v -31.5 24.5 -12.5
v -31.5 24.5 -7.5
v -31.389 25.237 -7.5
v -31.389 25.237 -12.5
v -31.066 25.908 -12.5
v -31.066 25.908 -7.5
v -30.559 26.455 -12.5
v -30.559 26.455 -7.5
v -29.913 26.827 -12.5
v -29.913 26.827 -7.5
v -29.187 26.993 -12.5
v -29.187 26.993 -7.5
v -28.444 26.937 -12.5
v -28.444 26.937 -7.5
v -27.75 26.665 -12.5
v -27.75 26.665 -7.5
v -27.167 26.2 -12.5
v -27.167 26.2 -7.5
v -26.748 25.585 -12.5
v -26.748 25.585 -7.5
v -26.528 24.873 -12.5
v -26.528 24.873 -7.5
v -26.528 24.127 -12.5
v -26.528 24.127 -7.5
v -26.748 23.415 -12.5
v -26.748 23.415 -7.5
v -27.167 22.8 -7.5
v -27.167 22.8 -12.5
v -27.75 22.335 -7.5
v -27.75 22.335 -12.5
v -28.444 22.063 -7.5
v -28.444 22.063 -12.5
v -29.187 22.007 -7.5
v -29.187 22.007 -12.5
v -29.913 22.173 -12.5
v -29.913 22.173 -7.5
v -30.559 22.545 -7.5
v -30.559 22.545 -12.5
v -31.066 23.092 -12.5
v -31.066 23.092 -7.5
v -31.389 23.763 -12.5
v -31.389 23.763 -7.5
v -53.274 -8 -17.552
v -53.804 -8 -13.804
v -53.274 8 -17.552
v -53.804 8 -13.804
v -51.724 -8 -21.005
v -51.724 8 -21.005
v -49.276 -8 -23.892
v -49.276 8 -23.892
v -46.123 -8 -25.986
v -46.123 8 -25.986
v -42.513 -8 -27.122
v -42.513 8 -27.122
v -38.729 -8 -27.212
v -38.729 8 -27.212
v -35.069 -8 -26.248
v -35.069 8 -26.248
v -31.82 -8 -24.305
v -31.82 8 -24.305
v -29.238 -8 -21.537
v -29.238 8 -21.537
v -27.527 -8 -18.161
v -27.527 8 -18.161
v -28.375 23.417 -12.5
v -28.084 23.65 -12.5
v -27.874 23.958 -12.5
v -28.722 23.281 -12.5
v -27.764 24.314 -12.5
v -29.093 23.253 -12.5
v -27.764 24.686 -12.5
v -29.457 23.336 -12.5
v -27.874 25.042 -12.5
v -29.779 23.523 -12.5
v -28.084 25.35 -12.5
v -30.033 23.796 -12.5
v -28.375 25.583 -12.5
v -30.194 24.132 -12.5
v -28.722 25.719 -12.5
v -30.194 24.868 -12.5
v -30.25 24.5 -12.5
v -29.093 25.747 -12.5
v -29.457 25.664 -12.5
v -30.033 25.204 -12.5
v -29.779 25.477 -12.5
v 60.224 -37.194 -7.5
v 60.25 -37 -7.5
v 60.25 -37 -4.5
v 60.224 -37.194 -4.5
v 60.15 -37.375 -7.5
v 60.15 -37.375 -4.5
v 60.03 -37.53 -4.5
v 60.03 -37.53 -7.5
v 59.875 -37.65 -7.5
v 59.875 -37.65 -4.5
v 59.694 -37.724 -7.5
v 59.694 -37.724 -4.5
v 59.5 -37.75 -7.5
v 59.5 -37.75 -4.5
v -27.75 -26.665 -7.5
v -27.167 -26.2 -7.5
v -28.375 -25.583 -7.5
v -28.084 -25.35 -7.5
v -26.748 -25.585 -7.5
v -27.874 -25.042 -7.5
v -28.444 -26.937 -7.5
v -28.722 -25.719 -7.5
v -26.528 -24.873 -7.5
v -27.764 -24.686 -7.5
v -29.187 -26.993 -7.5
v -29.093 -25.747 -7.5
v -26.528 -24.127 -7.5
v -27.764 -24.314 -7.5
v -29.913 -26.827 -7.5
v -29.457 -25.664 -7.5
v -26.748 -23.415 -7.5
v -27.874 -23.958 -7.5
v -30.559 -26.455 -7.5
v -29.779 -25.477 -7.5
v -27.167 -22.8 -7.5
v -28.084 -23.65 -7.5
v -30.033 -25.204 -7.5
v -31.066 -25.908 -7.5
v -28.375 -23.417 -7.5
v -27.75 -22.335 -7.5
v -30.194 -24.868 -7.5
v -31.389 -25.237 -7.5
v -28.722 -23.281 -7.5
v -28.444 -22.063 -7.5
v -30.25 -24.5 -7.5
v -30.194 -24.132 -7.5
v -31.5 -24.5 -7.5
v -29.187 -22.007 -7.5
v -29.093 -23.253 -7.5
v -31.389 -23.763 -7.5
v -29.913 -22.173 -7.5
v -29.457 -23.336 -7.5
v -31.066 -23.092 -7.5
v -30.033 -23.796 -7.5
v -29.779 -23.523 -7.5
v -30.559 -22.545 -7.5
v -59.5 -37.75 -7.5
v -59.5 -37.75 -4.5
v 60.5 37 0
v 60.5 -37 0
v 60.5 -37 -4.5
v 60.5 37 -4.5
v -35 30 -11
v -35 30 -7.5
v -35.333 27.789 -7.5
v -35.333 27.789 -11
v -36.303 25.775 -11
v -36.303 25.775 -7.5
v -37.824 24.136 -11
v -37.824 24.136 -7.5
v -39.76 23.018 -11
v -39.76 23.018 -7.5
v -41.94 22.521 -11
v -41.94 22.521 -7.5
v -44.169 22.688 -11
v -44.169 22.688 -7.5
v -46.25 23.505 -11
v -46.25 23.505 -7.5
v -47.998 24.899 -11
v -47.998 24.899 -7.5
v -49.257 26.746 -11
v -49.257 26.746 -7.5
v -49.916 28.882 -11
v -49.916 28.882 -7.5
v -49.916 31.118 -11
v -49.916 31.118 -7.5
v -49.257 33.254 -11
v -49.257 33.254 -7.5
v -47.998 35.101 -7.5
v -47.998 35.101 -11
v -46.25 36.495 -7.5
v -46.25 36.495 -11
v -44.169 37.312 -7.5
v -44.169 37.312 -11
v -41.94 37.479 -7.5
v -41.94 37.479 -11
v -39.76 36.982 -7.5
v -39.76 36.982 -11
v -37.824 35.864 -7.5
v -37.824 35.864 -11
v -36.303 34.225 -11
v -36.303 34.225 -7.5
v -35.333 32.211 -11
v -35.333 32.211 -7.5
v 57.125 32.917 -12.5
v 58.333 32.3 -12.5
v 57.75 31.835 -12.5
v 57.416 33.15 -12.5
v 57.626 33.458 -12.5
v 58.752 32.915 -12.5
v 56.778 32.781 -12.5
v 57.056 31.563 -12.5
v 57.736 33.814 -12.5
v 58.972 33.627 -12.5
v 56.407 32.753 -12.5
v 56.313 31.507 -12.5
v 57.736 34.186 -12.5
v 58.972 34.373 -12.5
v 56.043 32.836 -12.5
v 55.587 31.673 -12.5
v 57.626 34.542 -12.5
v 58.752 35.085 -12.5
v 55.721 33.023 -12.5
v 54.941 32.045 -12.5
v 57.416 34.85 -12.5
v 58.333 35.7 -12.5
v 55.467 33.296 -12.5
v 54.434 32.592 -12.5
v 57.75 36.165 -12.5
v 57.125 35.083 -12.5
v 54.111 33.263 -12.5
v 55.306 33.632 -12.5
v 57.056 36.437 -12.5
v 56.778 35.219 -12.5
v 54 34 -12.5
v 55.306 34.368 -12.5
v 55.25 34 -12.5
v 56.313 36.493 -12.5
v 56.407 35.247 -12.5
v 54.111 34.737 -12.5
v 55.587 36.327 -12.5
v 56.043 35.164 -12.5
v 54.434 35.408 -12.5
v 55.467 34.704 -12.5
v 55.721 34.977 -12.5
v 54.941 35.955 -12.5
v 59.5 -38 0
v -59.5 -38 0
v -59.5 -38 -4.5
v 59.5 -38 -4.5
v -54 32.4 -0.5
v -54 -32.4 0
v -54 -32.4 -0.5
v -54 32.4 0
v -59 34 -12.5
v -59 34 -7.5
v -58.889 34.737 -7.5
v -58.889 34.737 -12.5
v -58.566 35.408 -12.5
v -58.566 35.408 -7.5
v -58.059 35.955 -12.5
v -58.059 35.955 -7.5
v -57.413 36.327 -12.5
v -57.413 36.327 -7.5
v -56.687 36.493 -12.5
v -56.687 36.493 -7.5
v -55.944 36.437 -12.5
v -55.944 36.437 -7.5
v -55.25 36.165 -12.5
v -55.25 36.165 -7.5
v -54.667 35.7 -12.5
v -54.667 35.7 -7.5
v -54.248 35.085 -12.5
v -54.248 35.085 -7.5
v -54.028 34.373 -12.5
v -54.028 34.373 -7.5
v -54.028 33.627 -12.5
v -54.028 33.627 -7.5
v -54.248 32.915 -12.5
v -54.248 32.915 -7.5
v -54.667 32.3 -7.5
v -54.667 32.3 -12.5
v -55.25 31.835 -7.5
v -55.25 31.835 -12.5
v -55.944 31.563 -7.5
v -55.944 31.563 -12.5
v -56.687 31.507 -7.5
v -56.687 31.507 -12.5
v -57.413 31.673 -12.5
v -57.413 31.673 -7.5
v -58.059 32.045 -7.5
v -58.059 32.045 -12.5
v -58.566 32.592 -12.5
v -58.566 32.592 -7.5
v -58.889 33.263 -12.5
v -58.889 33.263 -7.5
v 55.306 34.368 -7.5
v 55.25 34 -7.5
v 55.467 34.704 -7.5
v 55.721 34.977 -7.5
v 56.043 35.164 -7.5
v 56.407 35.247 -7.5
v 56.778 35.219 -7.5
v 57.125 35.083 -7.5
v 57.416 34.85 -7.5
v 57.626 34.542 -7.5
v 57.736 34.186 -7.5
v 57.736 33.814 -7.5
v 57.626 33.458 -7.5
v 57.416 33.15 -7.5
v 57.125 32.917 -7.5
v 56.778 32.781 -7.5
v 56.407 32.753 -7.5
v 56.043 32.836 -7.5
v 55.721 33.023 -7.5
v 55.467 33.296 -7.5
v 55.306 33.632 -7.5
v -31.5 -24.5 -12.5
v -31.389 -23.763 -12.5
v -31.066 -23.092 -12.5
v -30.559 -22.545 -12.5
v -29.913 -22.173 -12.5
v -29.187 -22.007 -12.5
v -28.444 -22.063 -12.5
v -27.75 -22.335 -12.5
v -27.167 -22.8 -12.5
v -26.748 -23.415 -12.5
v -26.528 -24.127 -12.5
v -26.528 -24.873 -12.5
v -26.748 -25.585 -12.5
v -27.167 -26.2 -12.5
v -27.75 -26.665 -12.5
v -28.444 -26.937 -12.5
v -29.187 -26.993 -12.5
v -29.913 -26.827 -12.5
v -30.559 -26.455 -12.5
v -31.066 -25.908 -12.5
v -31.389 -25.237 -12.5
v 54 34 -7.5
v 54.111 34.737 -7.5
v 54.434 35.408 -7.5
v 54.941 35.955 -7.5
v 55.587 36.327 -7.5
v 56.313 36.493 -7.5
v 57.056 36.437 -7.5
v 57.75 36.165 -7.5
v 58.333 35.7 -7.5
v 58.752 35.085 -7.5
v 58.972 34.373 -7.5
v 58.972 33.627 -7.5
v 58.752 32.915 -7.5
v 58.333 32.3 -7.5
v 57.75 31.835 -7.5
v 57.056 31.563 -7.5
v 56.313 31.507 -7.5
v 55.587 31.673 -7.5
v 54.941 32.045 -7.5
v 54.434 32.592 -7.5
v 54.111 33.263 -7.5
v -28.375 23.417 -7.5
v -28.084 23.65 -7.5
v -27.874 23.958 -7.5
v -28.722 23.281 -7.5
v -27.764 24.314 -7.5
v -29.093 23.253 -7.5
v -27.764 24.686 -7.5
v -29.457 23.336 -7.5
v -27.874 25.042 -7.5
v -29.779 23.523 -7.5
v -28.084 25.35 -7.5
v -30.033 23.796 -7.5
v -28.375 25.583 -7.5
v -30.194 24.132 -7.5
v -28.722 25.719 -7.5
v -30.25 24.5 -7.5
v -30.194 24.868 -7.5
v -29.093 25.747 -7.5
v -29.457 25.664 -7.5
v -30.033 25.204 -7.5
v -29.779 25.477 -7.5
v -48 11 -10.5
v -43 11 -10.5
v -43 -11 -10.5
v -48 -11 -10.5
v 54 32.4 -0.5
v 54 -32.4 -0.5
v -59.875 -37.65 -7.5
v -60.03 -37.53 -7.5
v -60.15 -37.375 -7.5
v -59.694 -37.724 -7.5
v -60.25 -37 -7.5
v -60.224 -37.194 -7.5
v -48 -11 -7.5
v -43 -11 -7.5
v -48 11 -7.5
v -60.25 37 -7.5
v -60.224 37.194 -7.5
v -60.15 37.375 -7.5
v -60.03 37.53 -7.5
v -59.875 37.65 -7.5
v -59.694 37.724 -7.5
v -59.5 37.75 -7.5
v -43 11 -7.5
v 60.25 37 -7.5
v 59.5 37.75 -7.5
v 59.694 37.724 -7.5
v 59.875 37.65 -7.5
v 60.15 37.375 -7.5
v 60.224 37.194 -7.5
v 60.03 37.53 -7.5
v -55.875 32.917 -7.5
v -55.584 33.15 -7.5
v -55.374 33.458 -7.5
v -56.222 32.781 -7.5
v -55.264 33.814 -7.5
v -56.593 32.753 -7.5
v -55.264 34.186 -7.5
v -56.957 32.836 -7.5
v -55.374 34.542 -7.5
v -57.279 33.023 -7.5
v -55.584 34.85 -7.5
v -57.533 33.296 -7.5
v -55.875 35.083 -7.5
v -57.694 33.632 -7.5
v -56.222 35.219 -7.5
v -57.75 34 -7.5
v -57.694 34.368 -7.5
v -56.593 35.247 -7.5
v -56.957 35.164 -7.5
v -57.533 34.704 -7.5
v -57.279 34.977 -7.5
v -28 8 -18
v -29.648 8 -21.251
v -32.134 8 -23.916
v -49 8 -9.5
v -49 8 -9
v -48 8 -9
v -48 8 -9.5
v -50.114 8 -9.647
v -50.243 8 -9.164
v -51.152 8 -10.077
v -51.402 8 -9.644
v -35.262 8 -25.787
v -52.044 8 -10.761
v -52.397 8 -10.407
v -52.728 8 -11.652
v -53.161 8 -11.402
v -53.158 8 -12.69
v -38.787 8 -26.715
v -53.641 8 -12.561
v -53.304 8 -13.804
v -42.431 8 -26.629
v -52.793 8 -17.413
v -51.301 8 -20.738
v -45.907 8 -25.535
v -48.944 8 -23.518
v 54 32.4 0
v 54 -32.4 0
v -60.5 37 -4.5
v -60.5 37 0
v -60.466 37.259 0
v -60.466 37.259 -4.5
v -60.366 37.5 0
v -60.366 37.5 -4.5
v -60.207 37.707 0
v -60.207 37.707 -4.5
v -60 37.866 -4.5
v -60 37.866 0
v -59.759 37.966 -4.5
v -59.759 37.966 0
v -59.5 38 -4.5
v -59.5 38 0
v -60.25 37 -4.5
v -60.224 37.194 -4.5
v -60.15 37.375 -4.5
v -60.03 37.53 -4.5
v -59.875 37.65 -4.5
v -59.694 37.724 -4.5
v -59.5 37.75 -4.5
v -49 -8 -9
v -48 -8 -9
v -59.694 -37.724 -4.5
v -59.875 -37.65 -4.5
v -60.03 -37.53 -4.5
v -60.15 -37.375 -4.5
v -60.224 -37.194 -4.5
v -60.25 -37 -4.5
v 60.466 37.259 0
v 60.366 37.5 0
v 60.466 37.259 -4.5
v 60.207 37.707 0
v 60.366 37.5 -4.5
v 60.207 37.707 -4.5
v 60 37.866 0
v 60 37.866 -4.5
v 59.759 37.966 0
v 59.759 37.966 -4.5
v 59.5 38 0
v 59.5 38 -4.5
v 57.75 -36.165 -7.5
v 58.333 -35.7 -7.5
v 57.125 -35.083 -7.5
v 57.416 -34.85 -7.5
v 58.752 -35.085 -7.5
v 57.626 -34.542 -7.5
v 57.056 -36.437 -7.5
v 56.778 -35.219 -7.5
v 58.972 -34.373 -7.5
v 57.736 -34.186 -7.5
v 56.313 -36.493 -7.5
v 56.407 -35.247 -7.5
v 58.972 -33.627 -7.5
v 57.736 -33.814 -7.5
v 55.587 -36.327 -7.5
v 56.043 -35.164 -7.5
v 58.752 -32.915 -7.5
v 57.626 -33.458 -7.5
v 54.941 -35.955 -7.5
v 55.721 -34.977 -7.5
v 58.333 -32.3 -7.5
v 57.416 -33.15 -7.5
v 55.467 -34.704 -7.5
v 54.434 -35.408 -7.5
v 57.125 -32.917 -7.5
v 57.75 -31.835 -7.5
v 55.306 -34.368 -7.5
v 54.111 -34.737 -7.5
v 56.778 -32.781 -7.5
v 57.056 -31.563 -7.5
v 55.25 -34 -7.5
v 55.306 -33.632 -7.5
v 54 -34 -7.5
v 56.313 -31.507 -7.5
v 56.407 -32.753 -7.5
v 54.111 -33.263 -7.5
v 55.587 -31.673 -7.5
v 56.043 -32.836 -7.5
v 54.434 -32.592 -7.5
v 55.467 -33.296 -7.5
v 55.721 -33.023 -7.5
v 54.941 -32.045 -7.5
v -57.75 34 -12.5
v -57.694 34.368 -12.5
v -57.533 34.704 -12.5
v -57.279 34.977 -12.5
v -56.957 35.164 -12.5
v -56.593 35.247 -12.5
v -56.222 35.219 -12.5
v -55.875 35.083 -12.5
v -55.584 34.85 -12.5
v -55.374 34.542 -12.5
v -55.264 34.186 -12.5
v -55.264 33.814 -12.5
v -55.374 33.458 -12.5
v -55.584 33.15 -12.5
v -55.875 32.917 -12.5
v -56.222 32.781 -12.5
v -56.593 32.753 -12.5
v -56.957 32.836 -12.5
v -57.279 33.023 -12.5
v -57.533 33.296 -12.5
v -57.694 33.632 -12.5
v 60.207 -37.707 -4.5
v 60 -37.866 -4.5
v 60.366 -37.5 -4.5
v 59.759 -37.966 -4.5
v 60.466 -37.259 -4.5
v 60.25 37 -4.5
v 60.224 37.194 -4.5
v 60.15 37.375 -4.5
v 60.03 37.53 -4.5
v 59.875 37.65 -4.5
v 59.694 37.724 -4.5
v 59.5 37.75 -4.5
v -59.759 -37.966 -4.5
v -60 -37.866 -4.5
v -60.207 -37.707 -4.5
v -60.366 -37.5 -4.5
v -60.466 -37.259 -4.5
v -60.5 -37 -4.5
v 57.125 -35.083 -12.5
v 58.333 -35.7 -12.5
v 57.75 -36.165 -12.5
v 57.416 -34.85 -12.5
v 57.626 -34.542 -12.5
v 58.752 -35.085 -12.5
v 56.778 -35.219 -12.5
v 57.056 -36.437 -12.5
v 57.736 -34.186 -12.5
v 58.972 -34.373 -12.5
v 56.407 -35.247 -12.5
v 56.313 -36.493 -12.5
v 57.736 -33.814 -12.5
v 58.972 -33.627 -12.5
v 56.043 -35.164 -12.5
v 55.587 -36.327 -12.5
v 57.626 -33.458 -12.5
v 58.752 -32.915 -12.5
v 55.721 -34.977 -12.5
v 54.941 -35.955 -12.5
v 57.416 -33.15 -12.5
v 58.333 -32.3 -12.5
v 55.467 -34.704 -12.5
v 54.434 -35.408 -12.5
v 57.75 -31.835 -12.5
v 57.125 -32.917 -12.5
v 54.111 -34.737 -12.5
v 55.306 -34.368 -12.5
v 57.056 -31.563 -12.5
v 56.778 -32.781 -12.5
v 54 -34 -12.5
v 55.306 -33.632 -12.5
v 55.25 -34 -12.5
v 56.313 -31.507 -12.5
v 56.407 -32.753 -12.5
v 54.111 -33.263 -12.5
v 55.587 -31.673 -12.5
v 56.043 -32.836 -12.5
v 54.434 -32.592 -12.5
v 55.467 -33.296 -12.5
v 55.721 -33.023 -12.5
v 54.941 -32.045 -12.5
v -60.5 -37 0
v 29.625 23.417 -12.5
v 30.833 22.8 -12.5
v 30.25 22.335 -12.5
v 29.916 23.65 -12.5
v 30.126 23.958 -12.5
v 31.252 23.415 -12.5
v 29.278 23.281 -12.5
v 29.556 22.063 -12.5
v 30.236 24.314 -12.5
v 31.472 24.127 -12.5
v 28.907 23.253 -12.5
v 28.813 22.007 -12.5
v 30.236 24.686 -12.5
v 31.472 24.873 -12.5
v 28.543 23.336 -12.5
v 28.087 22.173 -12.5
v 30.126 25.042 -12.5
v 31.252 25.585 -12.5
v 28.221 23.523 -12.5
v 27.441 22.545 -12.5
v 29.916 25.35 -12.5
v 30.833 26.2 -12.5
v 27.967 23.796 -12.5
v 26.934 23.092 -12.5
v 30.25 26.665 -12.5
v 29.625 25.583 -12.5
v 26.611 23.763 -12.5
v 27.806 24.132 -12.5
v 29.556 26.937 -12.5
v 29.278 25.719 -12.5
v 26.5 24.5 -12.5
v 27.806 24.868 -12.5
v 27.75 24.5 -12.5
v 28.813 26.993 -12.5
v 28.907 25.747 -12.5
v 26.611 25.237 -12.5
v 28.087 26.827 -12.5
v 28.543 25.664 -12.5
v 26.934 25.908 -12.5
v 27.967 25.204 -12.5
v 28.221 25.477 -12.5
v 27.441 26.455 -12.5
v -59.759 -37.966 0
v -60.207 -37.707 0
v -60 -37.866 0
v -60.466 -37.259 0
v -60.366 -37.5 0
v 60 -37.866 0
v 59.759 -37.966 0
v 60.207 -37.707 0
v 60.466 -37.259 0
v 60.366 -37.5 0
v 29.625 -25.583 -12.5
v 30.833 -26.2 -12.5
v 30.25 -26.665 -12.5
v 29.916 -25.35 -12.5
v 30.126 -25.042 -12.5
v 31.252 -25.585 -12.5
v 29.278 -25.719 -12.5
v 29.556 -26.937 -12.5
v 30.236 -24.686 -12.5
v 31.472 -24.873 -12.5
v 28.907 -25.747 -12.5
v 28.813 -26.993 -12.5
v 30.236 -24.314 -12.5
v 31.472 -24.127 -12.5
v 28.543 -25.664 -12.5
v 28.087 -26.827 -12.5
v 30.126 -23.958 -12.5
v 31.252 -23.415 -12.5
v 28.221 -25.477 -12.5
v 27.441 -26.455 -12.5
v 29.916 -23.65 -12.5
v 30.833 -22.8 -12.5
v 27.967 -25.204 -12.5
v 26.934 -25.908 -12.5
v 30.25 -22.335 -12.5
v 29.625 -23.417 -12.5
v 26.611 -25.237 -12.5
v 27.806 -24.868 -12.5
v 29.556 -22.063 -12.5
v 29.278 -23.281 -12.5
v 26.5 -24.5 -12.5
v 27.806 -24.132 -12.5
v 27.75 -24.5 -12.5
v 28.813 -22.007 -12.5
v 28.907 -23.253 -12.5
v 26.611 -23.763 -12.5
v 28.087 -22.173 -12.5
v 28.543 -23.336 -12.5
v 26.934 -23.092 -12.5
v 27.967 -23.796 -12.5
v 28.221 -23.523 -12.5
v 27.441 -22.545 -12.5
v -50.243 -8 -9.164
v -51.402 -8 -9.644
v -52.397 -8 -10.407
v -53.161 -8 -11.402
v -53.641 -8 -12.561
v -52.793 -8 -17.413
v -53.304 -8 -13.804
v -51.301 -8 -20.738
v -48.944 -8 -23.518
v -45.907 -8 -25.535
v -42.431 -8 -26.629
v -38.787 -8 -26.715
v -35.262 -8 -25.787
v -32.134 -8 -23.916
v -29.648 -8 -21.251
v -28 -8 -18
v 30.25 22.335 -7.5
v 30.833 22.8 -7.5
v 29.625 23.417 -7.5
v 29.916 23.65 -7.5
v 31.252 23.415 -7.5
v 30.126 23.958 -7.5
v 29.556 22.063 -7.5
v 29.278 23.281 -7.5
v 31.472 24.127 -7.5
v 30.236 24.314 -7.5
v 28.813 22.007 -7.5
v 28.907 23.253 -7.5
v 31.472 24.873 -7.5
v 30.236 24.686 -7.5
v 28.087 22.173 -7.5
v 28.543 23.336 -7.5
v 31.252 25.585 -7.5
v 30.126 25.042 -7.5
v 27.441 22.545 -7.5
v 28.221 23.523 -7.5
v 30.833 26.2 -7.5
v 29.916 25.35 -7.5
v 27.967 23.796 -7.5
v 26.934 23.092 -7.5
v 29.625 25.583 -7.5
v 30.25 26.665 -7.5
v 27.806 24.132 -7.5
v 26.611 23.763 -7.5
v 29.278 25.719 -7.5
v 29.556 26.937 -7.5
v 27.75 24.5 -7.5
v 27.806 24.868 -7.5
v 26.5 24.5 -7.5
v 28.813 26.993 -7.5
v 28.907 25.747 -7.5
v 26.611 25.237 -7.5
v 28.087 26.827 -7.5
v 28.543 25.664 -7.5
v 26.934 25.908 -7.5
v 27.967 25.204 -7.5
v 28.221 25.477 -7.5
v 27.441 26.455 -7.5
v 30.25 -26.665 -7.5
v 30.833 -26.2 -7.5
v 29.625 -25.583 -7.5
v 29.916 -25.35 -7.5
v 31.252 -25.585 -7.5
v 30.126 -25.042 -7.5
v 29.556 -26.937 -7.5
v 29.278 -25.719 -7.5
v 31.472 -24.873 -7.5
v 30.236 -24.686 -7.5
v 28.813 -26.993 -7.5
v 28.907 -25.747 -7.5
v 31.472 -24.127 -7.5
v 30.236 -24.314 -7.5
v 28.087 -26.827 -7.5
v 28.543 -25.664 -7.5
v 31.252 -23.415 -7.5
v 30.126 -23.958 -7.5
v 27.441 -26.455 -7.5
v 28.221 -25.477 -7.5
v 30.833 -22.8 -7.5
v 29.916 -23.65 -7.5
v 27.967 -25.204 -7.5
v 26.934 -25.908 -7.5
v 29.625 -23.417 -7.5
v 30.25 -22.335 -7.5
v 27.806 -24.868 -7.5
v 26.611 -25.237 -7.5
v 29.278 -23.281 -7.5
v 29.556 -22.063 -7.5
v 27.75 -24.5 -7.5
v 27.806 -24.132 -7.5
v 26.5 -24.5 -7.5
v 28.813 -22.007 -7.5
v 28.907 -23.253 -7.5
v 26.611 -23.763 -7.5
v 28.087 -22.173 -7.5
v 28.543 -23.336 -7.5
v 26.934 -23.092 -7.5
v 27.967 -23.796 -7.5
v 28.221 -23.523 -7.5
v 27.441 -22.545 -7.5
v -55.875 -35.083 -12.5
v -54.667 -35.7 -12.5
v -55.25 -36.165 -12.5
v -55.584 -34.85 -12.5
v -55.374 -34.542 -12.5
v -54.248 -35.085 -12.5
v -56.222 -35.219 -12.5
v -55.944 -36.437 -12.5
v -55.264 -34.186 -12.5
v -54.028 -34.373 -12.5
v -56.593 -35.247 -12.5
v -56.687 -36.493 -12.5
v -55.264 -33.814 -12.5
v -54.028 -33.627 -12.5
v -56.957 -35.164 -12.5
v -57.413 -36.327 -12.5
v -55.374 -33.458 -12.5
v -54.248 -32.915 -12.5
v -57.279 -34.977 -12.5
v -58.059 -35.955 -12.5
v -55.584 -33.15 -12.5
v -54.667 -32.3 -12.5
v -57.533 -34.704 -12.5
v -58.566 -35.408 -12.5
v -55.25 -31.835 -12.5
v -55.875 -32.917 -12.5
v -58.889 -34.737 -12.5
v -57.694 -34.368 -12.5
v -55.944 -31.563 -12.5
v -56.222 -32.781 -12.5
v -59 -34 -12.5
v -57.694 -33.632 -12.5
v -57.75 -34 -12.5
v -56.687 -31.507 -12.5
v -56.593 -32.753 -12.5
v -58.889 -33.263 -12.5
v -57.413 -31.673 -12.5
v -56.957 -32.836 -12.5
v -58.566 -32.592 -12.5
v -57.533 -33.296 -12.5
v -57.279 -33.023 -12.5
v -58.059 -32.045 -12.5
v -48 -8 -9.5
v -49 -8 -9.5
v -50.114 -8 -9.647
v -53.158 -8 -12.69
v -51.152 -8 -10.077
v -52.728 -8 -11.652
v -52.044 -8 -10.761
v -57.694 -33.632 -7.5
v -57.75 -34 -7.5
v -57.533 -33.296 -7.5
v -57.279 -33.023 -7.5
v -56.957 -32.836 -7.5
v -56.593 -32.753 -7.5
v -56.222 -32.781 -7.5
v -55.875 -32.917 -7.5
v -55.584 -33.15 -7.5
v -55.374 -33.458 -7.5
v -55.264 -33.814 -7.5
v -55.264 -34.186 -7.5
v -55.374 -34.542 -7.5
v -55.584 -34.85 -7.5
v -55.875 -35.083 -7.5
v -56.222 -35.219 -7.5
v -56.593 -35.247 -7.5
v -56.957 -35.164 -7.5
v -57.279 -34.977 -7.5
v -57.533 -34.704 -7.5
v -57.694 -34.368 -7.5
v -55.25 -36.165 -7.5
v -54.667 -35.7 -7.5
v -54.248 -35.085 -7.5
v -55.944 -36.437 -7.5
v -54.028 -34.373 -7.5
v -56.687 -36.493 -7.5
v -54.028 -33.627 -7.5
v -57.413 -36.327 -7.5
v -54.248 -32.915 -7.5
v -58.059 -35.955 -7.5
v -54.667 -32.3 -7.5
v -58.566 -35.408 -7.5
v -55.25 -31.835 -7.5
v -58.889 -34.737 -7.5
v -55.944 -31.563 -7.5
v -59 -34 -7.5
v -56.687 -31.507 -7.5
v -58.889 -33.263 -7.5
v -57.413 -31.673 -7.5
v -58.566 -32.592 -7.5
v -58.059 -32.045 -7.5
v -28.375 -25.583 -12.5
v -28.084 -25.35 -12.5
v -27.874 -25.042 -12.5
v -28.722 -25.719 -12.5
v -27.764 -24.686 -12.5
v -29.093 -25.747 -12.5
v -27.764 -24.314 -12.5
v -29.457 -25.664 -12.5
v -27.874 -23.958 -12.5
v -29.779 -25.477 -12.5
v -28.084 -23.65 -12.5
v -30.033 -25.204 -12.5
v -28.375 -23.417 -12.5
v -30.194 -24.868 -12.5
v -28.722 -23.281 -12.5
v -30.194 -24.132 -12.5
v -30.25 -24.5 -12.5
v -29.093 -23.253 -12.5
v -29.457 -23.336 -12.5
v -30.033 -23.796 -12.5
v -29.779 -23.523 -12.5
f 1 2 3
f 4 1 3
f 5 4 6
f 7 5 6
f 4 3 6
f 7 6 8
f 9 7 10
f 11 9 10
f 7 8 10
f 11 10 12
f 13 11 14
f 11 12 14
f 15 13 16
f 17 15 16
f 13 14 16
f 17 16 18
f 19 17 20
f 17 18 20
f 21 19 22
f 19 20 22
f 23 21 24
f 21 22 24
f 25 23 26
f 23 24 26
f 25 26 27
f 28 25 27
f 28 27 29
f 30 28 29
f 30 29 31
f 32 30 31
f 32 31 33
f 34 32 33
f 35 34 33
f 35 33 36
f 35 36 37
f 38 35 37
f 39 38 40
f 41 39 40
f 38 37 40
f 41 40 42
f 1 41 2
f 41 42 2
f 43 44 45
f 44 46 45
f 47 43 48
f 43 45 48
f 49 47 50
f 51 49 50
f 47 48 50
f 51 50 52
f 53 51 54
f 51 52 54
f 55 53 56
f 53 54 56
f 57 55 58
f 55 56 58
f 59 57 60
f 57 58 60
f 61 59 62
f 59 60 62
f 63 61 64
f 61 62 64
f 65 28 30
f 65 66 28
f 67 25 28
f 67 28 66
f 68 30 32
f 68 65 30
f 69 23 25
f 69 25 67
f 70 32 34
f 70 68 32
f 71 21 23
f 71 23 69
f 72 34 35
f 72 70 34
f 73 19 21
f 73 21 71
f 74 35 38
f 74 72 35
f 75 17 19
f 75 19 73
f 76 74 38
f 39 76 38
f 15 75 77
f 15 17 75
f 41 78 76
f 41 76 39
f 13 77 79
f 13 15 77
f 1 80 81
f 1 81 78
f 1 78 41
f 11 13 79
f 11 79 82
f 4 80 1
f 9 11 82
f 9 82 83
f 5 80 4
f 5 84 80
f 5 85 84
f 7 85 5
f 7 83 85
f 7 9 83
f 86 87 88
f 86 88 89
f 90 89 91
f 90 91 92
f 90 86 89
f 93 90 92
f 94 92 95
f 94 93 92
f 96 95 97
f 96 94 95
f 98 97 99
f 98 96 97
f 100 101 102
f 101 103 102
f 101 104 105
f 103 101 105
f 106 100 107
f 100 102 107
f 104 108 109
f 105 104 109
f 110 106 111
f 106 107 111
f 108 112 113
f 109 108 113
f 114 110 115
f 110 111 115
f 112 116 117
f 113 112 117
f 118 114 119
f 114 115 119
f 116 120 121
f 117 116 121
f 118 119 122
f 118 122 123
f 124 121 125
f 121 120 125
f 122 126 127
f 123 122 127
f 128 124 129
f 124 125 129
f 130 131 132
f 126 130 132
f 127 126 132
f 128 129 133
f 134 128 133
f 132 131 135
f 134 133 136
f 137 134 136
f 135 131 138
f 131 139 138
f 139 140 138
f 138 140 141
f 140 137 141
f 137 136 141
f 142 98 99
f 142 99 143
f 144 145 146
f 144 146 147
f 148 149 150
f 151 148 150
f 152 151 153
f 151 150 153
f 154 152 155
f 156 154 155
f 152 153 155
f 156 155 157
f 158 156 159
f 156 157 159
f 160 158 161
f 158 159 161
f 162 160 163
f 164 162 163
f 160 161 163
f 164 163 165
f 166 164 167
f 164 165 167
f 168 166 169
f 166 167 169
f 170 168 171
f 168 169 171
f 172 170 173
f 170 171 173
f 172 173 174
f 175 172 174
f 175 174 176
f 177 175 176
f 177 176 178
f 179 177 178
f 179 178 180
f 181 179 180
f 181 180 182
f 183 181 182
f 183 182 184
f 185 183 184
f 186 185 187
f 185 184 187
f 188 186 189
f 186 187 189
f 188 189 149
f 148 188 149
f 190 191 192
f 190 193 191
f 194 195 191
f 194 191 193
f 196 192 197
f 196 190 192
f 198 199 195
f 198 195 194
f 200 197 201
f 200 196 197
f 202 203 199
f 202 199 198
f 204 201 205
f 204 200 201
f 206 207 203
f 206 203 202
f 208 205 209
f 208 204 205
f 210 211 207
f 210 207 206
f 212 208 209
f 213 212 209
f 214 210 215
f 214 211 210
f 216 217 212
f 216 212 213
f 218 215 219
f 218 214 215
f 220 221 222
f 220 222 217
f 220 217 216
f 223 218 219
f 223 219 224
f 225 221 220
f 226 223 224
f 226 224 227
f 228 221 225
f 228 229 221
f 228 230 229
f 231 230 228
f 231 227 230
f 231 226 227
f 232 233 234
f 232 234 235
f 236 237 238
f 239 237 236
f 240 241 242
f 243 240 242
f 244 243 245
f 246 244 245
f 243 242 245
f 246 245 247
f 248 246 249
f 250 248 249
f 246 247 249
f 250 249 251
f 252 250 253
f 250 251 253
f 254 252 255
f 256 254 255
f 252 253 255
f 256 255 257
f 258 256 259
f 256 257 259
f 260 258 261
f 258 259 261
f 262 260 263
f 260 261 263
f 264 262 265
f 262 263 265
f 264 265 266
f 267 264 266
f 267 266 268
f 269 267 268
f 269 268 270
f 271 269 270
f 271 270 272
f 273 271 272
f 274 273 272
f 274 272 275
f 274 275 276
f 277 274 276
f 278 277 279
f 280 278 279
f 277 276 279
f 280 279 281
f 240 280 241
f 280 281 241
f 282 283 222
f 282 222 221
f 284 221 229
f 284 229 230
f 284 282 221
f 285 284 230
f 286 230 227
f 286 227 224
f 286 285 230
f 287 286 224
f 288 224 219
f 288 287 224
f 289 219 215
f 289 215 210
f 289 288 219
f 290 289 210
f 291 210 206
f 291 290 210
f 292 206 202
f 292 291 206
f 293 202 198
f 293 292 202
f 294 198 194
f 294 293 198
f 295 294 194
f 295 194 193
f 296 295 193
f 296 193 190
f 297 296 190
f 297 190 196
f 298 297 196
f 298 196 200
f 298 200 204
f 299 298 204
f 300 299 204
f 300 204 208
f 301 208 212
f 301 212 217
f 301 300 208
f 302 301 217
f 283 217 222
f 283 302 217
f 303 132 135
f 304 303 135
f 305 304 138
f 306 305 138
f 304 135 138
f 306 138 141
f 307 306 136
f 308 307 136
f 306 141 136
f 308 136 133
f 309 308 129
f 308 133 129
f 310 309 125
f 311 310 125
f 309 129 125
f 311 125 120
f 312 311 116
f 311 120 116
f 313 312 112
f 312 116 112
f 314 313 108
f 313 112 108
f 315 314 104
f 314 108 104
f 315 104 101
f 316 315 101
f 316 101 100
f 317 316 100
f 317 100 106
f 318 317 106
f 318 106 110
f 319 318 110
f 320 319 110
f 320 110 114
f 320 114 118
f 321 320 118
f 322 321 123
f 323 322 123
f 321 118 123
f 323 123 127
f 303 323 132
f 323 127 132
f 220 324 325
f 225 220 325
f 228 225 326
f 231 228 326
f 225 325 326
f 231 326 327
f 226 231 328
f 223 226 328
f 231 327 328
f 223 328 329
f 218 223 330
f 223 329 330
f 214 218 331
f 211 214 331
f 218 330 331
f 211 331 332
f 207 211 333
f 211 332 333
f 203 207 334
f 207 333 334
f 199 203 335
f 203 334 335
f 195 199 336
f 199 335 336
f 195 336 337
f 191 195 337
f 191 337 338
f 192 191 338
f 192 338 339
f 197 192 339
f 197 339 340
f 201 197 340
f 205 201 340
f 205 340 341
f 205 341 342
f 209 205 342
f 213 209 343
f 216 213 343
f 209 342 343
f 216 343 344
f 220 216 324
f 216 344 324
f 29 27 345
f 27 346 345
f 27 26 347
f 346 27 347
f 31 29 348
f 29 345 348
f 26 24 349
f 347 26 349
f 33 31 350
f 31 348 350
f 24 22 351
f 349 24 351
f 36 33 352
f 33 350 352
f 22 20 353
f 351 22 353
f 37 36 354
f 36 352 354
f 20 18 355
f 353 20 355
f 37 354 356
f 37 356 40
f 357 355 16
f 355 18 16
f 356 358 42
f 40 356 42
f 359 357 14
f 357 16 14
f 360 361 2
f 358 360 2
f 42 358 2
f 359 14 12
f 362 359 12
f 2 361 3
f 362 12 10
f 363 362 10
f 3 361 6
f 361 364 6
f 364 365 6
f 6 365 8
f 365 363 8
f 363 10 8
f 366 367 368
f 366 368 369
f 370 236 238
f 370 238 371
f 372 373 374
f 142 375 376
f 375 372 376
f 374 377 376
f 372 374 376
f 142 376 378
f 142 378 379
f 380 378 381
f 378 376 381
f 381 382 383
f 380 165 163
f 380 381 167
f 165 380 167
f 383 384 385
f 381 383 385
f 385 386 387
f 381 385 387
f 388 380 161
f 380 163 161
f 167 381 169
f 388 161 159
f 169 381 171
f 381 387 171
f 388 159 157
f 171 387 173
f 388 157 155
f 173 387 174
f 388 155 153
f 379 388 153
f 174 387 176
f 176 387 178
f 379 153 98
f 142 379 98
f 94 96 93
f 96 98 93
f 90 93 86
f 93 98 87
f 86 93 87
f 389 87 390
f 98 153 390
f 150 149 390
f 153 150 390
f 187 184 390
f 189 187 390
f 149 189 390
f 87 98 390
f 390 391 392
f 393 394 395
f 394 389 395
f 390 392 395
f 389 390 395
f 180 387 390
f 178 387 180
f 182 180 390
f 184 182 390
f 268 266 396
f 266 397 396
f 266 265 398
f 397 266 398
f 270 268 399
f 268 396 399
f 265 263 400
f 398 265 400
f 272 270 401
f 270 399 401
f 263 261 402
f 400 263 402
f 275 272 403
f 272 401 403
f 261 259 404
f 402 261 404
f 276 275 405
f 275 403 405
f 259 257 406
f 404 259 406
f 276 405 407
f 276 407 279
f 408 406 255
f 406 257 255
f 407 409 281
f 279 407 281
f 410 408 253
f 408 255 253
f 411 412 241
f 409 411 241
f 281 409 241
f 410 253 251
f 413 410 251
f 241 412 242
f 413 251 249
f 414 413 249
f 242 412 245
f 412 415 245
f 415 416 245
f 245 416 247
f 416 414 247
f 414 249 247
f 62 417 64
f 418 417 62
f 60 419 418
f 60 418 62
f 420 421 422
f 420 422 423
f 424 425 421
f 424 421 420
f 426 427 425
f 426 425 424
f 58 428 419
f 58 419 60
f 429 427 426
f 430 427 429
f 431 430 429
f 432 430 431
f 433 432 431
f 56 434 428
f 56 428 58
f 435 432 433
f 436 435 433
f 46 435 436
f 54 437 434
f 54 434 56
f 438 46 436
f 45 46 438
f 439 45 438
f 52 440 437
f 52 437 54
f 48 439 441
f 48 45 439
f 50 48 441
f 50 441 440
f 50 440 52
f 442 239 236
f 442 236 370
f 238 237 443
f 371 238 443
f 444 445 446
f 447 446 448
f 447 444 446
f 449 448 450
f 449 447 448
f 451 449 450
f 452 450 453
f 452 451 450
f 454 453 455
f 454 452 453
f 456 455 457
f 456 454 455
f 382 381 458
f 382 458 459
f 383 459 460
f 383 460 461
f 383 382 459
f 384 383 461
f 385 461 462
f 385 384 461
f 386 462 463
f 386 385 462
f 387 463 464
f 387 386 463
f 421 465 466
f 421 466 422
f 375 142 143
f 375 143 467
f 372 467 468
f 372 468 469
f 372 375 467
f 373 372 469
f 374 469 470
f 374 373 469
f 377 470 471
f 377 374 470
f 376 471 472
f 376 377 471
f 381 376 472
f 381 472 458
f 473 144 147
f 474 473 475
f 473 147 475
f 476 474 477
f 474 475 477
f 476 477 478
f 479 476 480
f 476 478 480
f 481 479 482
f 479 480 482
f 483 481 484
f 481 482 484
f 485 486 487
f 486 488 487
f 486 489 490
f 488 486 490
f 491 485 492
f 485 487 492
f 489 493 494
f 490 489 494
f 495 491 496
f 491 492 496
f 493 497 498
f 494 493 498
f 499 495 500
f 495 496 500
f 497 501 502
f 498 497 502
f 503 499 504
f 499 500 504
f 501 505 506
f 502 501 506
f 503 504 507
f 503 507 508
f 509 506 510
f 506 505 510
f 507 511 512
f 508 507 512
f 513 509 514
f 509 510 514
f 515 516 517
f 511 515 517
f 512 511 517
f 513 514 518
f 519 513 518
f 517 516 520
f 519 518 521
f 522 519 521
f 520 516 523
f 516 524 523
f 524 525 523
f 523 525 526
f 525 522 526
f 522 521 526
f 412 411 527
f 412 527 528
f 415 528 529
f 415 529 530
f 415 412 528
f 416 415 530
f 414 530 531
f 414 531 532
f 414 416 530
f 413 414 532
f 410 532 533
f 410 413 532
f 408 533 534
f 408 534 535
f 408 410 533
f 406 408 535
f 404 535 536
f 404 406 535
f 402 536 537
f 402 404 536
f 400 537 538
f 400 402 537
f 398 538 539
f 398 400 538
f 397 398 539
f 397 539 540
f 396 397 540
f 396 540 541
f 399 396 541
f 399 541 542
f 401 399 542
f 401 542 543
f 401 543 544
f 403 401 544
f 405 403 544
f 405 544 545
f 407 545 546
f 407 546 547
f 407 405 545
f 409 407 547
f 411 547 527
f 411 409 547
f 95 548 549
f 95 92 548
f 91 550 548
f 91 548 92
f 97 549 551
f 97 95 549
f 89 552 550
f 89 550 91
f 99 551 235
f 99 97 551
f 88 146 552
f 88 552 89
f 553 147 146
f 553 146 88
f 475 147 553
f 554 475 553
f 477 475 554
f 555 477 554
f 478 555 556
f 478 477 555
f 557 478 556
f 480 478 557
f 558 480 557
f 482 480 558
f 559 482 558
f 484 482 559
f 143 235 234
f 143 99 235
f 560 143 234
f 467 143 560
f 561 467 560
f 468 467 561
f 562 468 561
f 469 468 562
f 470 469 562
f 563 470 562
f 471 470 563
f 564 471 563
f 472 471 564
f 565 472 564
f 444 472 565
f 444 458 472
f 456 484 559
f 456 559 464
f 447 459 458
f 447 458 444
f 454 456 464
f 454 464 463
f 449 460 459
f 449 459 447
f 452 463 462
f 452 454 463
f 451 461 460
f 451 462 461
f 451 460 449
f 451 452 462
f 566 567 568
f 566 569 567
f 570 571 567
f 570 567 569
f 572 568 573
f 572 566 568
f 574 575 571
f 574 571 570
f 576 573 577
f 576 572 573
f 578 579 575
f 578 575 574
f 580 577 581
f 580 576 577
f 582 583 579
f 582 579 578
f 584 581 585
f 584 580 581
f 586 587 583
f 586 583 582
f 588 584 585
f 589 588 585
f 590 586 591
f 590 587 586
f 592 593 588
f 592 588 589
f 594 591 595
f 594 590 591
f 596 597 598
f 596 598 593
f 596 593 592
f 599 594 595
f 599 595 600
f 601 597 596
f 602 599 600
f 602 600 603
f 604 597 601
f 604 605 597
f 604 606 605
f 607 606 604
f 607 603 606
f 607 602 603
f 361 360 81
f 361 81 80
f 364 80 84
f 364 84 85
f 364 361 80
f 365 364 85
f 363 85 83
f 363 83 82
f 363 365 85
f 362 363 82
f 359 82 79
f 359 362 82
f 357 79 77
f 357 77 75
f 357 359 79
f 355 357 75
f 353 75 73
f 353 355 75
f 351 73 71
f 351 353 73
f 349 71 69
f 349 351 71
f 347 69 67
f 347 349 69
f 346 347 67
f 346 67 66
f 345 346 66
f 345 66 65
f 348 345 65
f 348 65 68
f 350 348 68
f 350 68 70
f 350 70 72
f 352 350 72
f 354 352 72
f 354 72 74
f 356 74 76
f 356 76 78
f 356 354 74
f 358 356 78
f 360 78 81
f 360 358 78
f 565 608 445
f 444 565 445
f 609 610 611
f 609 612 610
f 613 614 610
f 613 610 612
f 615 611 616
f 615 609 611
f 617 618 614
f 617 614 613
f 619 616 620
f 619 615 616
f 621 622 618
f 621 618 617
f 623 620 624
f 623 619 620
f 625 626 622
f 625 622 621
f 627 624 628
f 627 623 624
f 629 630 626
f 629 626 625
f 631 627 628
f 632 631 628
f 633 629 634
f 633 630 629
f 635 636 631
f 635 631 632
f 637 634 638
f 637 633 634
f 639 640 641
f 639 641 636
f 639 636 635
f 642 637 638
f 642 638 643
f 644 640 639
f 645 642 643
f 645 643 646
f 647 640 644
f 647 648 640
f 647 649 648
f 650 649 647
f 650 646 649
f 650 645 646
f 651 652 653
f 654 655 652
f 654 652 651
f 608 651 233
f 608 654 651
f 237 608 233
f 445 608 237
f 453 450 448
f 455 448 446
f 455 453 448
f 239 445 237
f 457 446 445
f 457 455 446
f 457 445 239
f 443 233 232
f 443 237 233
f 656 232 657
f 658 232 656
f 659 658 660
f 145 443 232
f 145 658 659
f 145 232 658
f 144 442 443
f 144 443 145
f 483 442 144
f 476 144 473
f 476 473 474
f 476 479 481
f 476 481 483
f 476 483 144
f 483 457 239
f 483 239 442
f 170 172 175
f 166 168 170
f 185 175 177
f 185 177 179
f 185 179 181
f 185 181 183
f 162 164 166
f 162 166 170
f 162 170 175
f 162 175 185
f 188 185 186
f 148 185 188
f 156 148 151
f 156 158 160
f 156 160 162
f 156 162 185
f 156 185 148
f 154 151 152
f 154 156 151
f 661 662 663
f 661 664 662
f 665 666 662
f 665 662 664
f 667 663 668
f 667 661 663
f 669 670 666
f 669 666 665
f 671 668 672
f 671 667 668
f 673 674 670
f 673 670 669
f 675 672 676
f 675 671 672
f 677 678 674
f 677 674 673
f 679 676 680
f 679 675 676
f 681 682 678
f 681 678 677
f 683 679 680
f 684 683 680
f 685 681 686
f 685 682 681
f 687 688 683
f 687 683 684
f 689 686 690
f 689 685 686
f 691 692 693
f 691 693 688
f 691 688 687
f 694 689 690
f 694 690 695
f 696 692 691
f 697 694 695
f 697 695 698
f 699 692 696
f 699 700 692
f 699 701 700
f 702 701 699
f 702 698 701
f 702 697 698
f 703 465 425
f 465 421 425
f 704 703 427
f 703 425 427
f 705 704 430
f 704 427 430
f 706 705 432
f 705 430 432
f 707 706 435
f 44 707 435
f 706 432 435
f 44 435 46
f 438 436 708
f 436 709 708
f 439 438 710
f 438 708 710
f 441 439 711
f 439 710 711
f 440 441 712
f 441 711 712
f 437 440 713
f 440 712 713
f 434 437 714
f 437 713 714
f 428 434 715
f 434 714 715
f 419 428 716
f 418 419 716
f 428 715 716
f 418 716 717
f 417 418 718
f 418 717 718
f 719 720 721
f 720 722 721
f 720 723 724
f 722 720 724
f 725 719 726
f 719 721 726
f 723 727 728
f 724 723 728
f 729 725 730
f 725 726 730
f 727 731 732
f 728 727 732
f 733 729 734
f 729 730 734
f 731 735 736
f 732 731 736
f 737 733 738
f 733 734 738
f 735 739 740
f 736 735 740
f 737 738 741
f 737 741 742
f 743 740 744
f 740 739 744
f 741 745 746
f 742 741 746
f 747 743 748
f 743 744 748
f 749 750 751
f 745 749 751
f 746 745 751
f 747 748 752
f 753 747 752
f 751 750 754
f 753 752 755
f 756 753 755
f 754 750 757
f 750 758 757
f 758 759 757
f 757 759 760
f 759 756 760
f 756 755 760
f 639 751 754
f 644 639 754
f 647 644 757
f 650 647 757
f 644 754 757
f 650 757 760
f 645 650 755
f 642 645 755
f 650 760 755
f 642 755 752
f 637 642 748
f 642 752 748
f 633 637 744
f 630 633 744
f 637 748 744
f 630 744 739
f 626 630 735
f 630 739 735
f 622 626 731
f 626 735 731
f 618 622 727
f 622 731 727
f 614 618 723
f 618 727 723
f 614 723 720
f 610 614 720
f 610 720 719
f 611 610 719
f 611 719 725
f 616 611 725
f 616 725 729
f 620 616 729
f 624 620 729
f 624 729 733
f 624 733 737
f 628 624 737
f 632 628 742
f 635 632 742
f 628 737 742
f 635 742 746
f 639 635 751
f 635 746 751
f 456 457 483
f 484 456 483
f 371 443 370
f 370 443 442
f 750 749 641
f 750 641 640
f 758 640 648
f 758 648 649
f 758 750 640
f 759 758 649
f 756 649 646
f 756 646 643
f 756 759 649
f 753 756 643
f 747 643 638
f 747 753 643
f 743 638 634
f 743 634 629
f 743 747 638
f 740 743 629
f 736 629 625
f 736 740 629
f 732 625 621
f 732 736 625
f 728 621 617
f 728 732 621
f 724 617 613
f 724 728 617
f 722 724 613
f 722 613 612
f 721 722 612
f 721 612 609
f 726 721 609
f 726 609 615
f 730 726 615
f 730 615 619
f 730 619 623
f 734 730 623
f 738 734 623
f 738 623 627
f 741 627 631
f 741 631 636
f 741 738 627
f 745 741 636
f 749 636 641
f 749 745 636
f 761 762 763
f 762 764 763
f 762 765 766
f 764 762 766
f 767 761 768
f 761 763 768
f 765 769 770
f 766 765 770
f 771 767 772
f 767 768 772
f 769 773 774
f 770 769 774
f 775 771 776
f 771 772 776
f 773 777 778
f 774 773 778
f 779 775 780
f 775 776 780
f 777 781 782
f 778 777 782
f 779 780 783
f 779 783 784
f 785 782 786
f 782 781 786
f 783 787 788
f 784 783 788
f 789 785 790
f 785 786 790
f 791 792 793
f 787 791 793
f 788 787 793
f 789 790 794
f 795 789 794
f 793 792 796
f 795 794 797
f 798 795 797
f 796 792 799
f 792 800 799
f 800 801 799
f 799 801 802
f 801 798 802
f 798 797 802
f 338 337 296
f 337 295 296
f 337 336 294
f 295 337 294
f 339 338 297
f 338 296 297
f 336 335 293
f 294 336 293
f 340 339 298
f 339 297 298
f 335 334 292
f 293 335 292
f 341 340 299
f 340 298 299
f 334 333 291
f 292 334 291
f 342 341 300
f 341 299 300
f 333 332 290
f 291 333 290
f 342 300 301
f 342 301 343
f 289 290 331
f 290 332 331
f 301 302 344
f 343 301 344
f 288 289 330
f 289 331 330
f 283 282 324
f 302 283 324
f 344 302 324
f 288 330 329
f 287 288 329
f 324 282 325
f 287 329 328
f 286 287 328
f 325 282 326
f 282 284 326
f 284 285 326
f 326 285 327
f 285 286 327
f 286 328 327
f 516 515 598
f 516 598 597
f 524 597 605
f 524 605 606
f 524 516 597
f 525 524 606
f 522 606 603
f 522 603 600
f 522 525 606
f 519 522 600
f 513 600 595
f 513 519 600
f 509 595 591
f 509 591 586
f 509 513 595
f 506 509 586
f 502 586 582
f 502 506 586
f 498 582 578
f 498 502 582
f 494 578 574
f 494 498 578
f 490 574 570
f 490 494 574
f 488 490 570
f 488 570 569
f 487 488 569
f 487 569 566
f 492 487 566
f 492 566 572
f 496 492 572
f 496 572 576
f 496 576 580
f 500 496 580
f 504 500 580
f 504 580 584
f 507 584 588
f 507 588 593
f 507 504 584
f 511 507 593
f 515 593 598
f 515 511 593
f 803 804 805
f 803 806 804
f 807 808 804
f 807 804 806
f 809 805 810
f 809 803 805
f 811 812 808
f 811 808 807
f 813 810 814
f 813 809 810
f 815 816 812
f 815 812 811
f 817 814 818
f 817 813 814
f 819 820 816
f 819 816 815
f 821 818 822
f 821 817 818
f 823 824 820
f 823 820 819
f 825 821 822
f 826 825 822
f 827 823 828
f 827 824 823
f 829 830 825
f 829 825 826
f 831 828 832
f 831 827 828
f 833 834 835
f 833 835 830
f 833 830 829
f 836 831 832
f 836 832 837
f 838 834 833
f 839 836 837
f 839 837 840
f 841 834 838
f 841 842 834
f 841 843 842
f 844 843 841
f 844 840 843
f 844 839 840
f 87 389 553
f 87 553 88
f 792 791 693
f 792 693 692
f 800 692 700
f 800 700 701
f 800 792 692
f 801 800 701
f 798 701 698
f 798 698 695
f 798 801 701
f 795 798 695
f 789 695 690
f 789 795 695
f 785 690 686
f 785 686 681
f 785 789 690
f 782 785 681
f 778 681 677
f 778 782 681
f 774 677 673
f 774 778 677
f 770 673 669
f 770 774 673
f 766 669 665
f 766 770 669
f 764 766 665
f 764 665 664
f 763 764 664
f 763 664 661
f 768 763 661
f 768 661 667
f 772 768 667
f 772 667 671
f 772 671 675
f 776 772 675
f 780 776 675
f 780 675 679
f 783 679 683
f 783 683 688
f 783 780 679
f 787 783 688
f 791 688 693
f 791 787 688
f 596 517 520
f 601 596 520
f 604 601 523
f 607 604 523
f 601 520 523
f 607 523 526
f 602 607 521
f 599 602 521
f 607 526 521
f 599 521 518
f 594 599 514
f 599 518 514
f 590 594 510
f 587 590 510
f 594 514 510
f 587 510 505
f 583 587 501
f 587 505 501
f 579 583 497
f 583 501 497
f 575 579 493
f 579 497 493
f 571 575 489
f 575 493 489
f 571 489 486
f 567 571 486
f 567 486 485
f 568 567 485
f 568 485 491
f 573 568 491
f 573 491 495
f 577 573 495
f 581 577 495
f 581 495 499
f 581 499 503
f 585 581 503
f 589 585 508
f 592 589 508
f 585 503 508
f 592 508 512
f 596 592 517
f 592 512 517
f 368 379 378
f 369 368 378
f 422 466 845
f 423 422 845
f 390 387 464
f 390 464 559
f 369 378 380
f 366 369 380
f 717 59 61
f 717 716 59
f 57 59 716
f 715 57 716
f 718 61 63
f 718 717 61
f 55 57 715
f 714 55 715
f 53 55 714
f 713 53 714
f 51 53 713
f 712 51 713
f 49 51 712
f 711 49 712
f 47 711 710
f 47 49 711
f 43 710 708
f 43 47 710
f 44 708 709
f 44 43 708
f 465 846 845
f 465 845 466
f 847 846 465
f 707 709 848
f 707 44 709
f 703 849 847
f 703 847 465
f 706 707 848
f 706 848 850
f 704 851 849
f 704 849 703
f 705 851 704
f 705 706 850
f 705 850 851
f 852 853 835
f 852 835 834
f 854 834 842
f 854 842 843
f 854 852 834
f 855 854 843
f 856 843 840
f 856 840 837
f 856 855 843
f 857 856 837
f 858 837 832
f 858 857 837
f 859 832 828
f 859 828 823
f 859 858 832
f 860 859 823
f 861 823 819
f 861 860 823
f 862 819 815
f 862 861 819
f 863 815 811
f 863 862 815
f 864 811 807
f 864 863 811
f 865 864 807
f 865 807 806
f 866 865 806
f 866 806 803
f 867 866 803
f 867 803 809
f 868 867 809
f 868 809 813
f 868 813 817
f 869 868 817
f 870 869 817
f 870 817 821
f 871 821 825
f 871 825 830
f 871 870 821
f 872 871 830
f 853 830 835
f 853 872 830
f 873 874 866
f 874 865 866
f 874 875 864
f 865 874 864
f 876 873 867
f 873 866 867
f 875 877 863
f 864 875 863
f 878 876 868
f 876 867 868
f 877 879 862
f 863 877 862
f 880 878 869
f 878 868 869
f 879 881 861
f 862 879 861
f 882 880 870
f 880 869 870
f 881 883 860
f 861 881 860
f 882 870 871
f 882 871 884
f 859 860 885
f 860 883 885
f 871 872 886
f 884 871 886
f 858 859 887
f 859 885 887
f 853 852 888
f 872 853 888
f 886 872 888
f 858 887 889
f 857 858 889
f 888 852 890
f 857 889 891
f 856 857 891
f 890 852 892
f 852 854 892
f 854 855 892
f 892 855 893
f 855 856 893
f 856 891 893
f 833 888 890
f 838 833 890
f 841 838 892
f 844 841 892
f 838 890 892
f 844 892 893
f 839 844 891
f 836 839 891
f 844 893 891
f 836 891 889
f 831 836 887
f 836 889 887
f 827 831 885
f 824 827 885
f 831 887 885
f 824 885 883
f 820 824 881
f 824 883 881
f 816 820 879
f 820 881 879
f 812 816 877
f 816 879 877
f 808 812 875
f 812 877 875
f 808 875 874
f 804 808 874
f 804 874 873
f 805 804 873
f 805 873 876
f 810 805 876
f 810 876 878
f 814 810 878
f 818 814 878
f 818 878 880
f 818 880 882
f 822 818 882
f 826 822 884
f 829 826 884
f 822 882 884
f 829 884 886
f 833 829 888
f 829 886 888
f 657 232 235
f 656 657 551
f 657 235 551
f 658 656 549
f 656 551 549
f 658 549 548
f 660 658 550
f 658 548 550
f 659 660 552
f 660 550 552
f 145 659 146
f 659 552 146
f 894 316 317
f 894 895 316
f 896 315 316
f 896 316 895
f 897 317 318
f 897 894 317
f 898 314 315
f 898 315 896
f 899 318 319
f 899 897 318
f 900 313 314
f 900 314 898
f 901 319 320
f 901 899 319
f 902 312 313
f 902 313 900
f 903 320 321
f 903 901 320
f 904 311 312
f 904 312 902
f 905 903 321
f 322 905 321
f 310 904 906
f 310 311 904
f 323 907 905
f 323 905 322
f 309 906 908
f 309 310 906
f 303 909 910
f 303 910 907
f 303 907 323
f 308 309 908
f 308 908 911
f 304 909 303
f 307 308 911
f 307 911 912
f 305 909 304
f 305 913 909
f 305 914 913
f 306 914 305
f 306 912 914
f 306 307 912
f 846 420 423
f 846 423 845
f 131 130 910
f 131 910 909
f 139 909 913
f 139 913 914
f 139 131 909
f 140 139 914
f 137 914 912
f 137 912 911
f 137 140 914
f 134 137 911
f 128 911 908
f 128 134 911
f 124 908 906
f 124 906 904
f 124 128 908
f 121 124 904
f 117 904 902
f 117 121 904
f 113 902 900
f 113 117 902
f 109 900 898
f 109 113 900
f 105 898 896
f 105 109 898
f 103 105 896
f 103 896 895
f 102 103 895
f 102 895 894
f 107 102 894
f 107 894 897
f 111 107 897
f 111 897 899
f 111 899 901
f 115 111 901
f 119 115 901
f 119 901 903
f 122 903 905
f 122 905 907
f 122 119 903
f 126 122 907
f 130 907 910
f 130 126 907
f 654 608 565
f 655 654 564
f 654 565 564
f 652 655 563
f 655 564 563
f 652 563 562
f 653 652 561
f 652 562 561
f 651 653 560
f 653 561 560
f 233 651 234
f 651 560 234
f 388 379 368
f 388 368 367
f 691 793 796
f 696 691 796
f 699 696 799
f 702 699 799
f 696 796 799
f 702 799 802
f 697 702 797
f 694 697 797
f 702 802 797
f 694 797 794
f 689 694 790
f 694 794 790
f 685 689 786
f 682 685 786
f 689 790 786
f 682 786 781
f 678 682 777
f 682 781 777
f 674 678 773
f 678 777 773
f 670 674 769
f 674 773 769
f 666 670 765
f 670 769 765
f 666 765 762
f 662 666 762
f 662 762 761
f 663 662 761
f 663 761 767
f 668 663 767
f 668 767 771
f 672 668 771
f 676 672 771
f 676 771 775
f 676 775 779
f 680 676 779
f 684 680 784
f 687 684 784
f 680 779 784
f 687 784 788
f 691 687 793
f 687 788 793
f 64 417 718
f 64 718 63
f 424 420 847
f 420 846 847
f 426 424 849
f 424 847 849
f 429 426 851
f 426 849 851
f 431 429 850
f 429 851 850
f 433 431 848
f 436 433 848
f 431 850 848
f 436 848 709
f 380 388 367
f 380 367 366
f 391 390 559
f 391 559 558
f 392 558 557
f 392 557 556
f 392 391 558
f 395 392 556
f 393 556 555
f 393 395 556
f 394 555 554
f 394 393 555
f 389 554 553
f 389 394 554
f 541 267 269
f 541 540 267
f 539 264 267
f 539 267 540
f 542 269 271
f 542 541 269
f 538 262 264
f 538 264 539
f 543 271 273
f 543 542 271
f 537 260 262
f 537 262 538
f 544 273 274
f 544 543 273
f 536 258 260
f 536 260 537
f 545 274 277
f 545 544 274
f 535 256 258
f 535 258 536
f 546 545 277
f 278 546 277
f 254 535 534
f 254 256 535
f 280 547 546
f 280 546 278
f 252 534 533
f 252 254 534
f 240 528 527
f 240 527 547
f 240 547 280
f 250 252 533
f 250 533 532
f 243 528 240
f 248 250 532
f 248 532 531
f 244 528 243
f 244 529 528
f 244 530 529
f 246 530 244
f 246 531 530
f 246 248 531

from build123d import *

# Parameters (mm, degrees)
ESQUISSE1_W                     = 121
ESQUISSE1_H                     = 76
BOSS_EXTRU_1_DEPTH              = 7.5
ESQUISSE2_R                     = 2.5
ESQUISSE2_R_2                   = 1.25
EXTRU_MINCE1_DEPTH              = 5
EXTRU_MINCE1_2_DEPTH            = 5
EXTRU_MINCE1_3_DEPTH            = 5
EXTRU_MINCE1_4_DEPTH            = 5
EXTRU_MINCE1_5_DEPTH            = 5
EXTRU_MINCE1_6_DEPTH            = 5
EXTRU_MINCE1_7_DEPTH            = 5
EXTRU_MINCE1_8_DEPTH            = 5
CONG_1_R                        = 1
ESQUISSE3_W                     = 108
ESQUISSE3_H                     = 64.8
ENL_V_MAT_EXTRU_1_DEPTH         = 0.5
ENL_V_DE_MAT_EXTRU_MINCE1_DEPTH = 3
ESQUISSE5_R                     = 7.5
BOSS_EXTRU_2_DEPTH              = 3.5
ESQUISSE6_W                     = 5
ESQUISSE6_H                     = 22
BOSS_EXTRU_3_DEPTH              = 3
ESQUISSE7_W                     = 0.5
ESQUISSE7_H                     = 16


with BuildPart() as part:
    # Esquisse1 → Boss.-Extru.1 (new body)
    with BuildSketch(Plane.XY):
        Rectangle(ESQUISSE1_W, ESQUISSE1_H)
    extrude(amount=-BOSS_EXTRU_1_DEPTH)

    # Congé1
    cong_1_edges = [part.edges().sort_by_distance(p)[0] for p in [
        (-60.5, 38, -3.75),
        (60.5, 38, -3.75),
        (60.5, -38, -3.75),
        (-60.5, -38, -3.75),
    ]]
    fillet(cong_1_edges, radius=CONG_1_R)

    # Esquisse3 → Enlèv. mat.-Extru.1 (cut)
    with BuildSketch(Plane.XY):
        Rectangle(ESQUISSE3_W, ESQUISSE3_H)
    extrude(amount=-ENL_V_MAT_EXTRU_1_DEPTH, mode=Mode.SUBTRACT)

    # Esquisse4 → Enlèv. de mat.-Extru.-Mince1 (cut)
    with BuildSketch(Plane(origin=(0, 0, -7.5), x_dir=(-1, 0, 0), z_dir=(0, 0, -1))):
        with BuildLine():
            Line((-59.5, -38), (59.5, -38))
            ThreePointArc((59.5, -38), (60.207106781, -37.707106781), (60.5, -37))
            Line((60.5, -37), (60.5, 37))
            ThreePointArc((60.5, 37), (60.207106781, 37.707106781), (59.5, 38))
            Line((59.5, 38), (-59.5, 38))
            ThreePointArc((-59.5, 38), (-60.207106781, 37.707106781), (-60.5, 37))
            Line((-60.5, 37), (-60.5, -37))
            ThreePointArc((-60.5, -37), (-60.207106781, -37.707106781), (-59.5, -38))
        make_face()
        with BuildLine():
            Line((-59.5, -37.75), (59.5, -37.75))
            ThreePointArc((59.5, -37.75), (60.030330086, -37.530330086), (60.25, -37))
            Line((60.25, -37), (60.25, 37))
            ThreePointArc((60.25, 37), (60.030330086, 37.530330086), (59.5, 37.75))
            Line((59.5, 37.75), (-59.5, 37.75))
            ThreePointArc((-59.5, 37.75), (-60.030330086, 37.530330086), (-60.25, 37))
            Line((-60.25, 37), (-60.25, -37))
            ThreePointArc((-60.25, -37), (-60.030330086, -37.530330086), (-59.5, -37.75))
        make_face(mode=Mode.SUBTRACT)
    extrude(amount=-ENL_V_DE_MAT_EXTRU_MINCE1_DEPTH, mode=Mode.SUBTRACT)

    # Esquisse5 → Boss.-Extru.2 (add)
    with BuildSketch(Plane(origin=(0, 0, -7.5), x_dir=(-1, 0, 0), z_dir=(0, 0, -1))):
        with Locations(Location((42.5, 30, 0), (0, 0, 180))):
            Circle(ESQUISSE5_R)
    extrude(amount=BOSS_EXTRU_2_DEPTH)

    # Esquisse6 → Boss.-Extru.3 (add)
    with BuildSketch(Plane(origin=(0, 0, -7.5), x_dir=(-1, 0, 0), z_dir=(0, 0, -1))):
        with Locations((45.5, 0)):
            Rectangle(ESQUISSE6_W, ESQUISSE6_H)
    extrude(amount=BOSS_EXTRU_3_DEPTH)


with BuildPart() as body_2:
    # Esquisse2 → Extru.-Mince1 (new body)
    with BuildSketch(Plane(origin=(0, 0, -7.5), x_dir=(-1, 0, 0), z_dir=(0, 0, -1))):
        with Locations((-56.5, 34)):
            Circle(ESQUISSE2_R)
        with Locations((-56.5, 34)):
            Circle(ESQUISSE2_R_2, mode=Mode.SUBTRACT)
    extrude(amount=EXTRU_MINCE1_DEPTH)


with BuildPart() as body_3:
    # Esquisse2 → Extru.-Mince1 2 (new body)
    with BuildSketch(Plane(origin=(0, 0, -7.5), x_dir=(-1, 0, 0), z_dir=(0, 0, -1))):
        with Locations((-56.5, -34)):
            Circle(ESQUISSE2_R)
        with Locations((-56.5, -34)):
            Circle(ESQUISSE2_R_2, mode=Mode.SUBTRACT)
    extrude(amount=EXTRU_MINCE1_2_DEPTH)


with BuildPart() as body_4:
    # Esquisse2 → Extru.-Mince1 3 (new body)
    with BuildSketch(Plane(origin=(0, 0, -7.5), x_dir=(-1, 0, 0), z_dir=(0, 0, -1))):
        with Locations((-29, 24.5)):
            Circle(ESQUISSE2_R)
        with Locations((-29, 24.5)):
            Circle(ESQUISSE2_R_2, mode=Mode.SUBTRACT)
    extrude(amount=EXTRU_MINCE1_3_DEPTH)


with BuildPart() as body_5:
    # Esquisse2 → Extru.-Mince1 4 (new body)
    with BuildSketch(Plane(origin=(0, 0, -7.5), x_dir=(-1, 0, 0), z_dir=(0, 0, -1))):
        with Locations((-29, -24.5)):
            Circle(ESQUISSE2_R)
        with Locations((-29, -24.5)):
            Circle(ESQUISSE2_R_2, mode=Mode.SUBTRACT)
    extrude(amount=EXTRU_MINCE1_4_DEPTH)


with BuildPart() as body_6:
    # Esquisse2 → Extru.-Mince1 5 (new body)
    with BuildSketch(Plane(origin=(0, 0, -7.5), x_dir=(-1, 0, 0), z_dir=(0, 0, -1))):
        with Locations((29, 24.5)):
            Circle(ESQUISSE2_R)
        with Locations((29, 24.5)):
            Circle(ESQUISSE2_R_2, mode=Mode.SUBTRACT)
    extrude(amount=EXTRU_MINCE1_5_DEPTH)


with BuildPart() as body_7:
    # Esquisse2 → Extru.-Mince1 6 (new body)
    with BuildSketch(Plane(origin=(0, 0, -7.5), x_dir=(-1, 0, 0), z_dir=(0, 0, -1))):
        with Locations((29, -24.5)):
            Circle(ESQUISSE2_R)
        with Locations((29, -24.5)):
            Circle(ESQUISSE2_R_2, mode=Mode.SUBTRACT)
    extrude(amount=EXTRU_MINCE1_6_DEPTH)


with BuildPart() as body_8:
    # Esquisse2 → Extru.-Mince1 7 (new body)
    with BuildSketch(Plane(origin=(0, 0, -7.5), x_dir=(-1, 0, 0), z_dir=(0, 0, -1))):
        with Locations((56.5, 34)):
            Circle(ESQUISSE2_R)
        with Locations((56.5, 34)):
            Circle(ESQUISSE2_R_2, mode=Mode.SUBTRACT)
    extrude(amount=EXTRU_MINCE1_7_DEPTH)


with BuildPart() as body_9:
    # Esquisse2 → Extru.-Mince1 8 (new body)
    with BuildSketch(Plane(origin=(0, 0, -7.5), x_dir=(-1, 0, 0), z_dir=(0, 0, -1))):
        with Locations((56.5, -34)):
            Circle(ESQUISSE2_R)
        with Locations((56.5, -34)):
            Circle(ESQUISSE2_R_2, mode=Mode.SUBTRACT)
    extrude(amount=EXTRU_MINCE1_8_DEPTH)


with BuildPart() as body_10:
    # Balayage1: sweep along a path in Esquisse8
    with BuildLine(Plane(origin=(0, 0, 0), x_dir=(1, 0, 0), z_dir=(0, 1, 0))) as balayage1_path:
        Line((-48, 9.5), (-49, 9.5))
        ThreePointArc((-49, 9.5), (-52.043612931, 10.760705754), (-53.304318685, 13.804318685))
        ThreePointArc((-53.304318685, 13.804318685), (-42.430801355, 26.629219131), (-28, 18))
    # Esquisse7 → Balayage1 (sweep)
    with BuildSketch(Plane.ZY.offset(48)):
        with Locations((-9.25, 0)):
            Rectangle(ESQUISSE7_W, ESQUISSE7_H)
    sweep(path=balayage1_path.line)


solid = Compound([part.part, body_2.part, body_3.part, body_4.part, body_5.part, body_6.part, body_7.part, body_8.part, body_9.part, body_10.part])
